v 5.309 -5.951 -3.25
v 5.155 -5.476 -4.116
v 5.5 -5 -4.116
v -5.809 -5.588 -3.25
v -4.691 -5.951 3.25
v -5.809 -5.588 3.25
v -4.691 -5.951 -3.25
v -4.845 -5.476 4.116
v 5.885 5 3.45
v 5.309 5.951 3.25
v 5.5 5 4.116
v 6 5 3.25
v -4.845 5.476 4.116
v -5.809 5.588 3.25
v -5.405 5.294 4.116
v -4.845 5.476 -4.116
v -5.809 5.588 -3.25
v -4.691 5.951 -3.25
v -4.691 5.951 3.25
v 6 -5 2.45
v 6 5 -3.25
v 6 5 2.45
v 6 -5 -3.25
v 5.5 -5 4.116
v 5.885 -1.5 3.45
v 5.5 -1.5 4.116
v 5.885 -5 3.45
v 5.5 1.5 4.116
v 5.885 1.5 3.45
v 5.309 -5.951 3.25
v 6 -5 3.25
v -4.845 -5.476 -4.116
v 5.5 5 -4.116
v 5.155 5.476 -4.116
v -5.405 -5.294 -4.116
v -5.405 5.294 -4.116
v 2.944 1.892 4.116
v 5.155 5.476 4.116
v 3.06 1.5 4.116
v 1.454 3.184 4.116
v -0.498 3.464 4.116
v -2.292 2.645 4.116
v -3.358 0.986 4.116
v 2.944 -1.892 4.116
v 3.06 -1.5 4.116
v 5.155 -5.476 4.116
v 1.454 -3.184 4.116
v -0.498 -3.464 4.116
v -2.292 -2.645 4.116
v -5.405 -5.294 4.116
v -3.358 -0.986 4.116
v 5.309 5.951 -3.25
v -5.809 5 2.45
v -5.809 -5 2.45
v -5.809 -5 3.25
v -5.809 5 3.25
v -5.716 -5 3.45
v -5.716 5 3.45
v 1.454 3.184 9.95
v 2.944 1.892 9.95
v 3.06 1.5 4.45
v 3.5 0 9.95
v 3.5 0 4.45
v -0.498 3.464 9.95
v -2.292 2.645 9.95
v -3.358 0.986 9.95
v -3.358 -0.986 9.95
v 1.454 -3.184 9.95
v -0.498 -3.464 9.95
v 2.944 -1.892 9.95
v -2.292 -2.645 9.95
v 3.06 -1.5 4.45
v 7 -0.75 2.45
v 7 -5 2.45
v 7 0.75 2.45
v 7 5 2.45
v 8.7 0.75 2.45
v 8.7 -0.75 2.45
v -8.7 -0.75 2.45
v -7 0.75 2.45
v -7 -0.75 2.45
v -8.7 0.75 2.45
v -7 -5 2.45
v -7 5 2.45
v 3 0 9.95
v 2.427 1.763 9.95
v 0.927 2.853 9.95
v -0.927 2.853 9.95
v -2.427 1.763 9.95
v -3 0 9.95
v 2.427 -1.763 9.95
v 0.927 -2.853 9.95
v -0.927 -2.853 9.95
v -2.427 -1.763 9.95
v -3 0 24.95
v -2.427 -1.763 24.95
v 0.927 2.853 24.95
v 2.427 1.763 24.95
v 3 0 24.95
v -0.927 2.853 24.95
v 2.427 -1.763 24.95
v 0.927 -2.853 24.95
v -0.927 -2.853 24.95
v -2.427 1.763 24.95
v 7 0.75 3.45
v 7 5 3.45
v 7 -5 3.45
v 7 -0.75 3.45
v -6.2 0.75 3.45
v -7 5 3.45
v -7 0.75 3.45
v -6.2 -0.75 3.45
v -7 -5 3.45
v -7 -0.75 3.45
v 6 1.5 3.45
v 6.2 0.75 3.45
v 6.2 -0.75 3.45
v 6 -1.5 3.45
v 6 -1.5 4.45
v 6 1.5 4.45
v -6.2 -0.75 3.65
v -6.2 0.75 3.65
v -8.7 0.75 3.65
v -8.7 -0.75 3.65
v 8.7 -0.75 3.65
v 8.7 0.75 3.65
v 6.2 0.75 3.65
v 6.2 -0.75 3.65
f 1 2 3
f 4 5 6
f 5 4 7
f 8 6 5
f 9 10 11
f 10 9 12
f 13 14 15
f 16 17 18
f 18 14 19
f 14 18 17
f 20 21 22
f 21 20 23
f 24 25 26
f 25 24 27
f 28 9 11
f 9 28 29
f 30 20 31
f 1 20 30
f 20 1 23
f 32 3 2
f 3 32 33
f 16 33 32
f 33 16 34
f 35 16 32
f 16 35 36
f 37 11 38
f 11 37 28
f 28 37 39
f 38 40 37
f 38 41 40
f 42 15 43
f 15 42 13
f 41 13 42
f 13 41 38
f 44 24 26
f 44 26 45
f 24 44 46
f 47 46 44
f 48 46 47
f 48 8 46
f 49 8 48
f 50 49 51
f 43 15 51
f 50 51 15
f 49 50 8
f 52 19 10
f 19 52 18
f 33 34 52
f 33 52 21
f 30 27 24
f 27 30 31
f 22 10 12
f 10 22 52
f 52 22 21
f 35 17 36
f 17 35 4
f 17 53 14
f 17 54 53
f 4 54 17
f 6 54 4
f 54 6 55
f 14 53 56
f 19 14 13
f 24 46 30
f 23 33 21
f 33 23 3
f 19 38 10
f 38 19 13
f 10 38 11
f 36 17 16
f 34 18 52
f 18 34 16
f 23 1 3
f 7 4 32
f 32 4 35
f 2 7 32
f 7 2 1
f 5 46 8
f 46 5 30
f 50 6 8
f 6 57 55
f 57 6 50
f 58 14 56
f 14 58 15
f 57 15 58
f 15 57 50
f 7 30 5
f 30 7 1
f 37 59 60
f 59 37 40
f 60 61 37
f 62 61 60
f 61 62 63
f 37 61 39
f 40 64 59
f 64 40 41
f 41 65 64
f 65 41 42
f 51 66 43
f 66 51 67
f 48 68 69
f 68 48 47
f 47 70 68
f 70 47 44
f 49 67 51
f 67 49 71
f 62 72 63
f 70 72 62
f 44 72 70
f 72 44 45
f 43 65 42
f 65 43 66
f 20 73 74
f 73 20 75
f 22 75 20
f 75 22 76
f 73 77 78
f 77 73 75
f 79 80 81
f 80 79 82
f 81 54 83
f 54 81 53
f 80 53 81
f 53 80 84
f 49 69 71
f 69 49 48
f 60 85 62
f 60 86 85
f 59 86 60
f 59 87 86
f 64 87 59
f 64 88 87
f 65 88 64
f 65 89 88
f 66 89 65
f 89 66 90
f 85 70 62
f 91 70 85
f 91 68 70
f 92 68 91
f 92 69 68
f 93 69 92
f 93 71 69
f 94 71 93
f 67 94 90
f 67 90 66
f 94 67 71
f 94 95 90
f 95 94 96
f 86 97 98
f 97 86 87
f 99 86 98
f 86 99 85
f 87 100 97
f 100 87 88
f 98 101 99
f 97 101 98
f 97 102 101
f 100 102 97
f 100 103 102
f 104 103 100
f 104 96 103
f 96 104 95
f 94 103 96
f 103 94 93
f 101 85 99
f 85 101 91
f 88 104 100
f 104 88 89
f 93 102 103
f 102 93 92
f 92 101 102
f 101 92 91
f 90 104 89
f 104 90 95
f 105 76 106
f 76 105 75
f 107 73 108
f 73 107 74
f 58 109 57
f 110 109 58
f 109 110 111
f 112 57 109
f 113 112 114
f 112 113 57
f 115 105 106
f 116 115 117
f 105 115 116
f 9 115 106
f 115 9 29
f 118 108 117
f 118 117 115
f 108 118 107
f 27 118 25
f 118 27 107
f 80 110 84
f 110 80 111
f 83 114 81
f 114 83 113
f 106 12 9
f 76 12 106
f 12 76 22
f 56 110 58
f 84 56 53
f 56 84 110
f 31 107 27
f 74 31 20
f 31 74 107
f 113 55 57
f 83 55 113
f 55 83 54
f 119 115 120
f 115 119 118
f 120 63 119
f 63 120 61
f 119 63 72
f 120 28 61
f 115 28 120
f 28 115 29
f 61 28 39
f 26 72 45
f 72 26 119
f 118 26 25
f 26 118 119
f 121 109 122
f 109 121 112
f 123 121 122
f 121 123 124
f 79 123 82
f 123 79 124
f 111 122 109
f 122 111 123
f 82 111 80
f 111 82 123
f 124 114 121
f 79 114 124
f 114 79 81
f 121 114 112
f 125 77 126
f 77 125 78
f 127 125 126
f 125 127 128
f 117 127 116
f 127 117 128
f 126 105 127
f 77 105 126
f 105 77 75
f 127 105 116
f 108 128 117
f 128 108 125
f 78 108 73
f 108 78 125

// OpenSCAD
// Parameters
body_width = 12; //[6:24:0.5]
body_depth = 12; //[6:24:0.5]
body_height = 6.5; //[3.25:13:0.25]
corner_radius = 1; //[0.5:2:0.1]
thickness = 3; //[1.5:6:0.5]
shaft_length = 15; //[7.5:30:0.5]
eps = 0.8; //[0.5:2:0.1]
boss_d = 7; //[3.5:14:0.5]
boss_h = 1.5; //[0.75:3:0.25]
thread_d = 7; //[4:12:0.5]
thread_h = 6; //[3:12:0.5]
shaft_d = 6; //[3:10:0.5]
face_plate_w = 14; //[10:28:0.5]
face_plate_d = 10; //[6:20:0.5]
face_plate_t = 1; //[0.5:2:0.1]
spigot_w = 4; //[2:8:0.5]
spigot_d = 3; //[1.5:6:0.5]
spigot_h = 2; //[1:4:0.25]
spigot_offset_x = 4; //[0:8:0.5]
wafer_count = 2; //[1:4:1]
wafer_t = 1; //[0.5:2:0.25]
tab_w = 2.5; //[1.5:5:0.25]
tab_d = 1.5; //[1:3:0.25]
tab_h = 1.2; //[0.6:2.4:0.1]

// Potentiometer - complete geometry
module potentiometer() {
  color("DimGray") {
    // Body with rounded corners
    minkowski() {
      translate([0, 0, 0])
        cube([body_width - 2*corner_radius, body_depth - 2*corner_radius, body_height], center=true);
      sphere(r=corner_radius, center=true);
    }
    
    // Boss
    translate([0, 0, body_height/2 + boss_h/2 - eps])
      cylinder(r=boss_d/2, h=boss_h, center=true);
    
    // Threaded bushing
    translate([0, 0, body_height/2 + boss_h + thread_h/2 - eps])
      cylinder(r=thread_d/2, h=thread_h, center=true);
    
    // Shaft
    translate([0, 0, body_height/2 + boss_h + thread_h + shaft_length/2 - eps])
      cylinder(r=shaft_d/2, h=shaft_length, center=true);
    
    // Face plate
    translate([0, 0, body_height/2 + face_plate_t/2 - eps])
      cube([face_plate_w, face_plate_d, face_plate_t], center=true);
    
    // Mounting spigot
    translate([spigot_offset_x, 0, body_height/2 + spigot_h/2 - eps])
      cube([spigot_w, spigot_d, spigot_h], center=true);
    
    // Wafer sections
    for (i = [0:wafer_count-1]) {
      translate([0, 0, -body_height/2 + wafer_t/2 + (i+1)*(body_height - wafer_count*wafer_t)/(wafer_count+1) + i*wafer_t])
        cube([body_width - 2*corner_radius, body_depth - 2*corner_radius, wafer_t], center=true);
    }
    
    // Anti-rotation tabs
    translate([-(face_plate_w/2 + tab_w/2 - eps), 0, body_height/2 + tab_h/2 - eps])
      cube([tab_w, tab_d, tab_h], center=true);
    translate([face_plate_w/2 + tab_w/2 - eps, 0, body_height/2 + tab_h/2 - eps])
      cube([tab_w, tab_d, tab_h], center=true);
  }
}

// Assembly
module assembly() {
  potentiometer();
}

assembly();
